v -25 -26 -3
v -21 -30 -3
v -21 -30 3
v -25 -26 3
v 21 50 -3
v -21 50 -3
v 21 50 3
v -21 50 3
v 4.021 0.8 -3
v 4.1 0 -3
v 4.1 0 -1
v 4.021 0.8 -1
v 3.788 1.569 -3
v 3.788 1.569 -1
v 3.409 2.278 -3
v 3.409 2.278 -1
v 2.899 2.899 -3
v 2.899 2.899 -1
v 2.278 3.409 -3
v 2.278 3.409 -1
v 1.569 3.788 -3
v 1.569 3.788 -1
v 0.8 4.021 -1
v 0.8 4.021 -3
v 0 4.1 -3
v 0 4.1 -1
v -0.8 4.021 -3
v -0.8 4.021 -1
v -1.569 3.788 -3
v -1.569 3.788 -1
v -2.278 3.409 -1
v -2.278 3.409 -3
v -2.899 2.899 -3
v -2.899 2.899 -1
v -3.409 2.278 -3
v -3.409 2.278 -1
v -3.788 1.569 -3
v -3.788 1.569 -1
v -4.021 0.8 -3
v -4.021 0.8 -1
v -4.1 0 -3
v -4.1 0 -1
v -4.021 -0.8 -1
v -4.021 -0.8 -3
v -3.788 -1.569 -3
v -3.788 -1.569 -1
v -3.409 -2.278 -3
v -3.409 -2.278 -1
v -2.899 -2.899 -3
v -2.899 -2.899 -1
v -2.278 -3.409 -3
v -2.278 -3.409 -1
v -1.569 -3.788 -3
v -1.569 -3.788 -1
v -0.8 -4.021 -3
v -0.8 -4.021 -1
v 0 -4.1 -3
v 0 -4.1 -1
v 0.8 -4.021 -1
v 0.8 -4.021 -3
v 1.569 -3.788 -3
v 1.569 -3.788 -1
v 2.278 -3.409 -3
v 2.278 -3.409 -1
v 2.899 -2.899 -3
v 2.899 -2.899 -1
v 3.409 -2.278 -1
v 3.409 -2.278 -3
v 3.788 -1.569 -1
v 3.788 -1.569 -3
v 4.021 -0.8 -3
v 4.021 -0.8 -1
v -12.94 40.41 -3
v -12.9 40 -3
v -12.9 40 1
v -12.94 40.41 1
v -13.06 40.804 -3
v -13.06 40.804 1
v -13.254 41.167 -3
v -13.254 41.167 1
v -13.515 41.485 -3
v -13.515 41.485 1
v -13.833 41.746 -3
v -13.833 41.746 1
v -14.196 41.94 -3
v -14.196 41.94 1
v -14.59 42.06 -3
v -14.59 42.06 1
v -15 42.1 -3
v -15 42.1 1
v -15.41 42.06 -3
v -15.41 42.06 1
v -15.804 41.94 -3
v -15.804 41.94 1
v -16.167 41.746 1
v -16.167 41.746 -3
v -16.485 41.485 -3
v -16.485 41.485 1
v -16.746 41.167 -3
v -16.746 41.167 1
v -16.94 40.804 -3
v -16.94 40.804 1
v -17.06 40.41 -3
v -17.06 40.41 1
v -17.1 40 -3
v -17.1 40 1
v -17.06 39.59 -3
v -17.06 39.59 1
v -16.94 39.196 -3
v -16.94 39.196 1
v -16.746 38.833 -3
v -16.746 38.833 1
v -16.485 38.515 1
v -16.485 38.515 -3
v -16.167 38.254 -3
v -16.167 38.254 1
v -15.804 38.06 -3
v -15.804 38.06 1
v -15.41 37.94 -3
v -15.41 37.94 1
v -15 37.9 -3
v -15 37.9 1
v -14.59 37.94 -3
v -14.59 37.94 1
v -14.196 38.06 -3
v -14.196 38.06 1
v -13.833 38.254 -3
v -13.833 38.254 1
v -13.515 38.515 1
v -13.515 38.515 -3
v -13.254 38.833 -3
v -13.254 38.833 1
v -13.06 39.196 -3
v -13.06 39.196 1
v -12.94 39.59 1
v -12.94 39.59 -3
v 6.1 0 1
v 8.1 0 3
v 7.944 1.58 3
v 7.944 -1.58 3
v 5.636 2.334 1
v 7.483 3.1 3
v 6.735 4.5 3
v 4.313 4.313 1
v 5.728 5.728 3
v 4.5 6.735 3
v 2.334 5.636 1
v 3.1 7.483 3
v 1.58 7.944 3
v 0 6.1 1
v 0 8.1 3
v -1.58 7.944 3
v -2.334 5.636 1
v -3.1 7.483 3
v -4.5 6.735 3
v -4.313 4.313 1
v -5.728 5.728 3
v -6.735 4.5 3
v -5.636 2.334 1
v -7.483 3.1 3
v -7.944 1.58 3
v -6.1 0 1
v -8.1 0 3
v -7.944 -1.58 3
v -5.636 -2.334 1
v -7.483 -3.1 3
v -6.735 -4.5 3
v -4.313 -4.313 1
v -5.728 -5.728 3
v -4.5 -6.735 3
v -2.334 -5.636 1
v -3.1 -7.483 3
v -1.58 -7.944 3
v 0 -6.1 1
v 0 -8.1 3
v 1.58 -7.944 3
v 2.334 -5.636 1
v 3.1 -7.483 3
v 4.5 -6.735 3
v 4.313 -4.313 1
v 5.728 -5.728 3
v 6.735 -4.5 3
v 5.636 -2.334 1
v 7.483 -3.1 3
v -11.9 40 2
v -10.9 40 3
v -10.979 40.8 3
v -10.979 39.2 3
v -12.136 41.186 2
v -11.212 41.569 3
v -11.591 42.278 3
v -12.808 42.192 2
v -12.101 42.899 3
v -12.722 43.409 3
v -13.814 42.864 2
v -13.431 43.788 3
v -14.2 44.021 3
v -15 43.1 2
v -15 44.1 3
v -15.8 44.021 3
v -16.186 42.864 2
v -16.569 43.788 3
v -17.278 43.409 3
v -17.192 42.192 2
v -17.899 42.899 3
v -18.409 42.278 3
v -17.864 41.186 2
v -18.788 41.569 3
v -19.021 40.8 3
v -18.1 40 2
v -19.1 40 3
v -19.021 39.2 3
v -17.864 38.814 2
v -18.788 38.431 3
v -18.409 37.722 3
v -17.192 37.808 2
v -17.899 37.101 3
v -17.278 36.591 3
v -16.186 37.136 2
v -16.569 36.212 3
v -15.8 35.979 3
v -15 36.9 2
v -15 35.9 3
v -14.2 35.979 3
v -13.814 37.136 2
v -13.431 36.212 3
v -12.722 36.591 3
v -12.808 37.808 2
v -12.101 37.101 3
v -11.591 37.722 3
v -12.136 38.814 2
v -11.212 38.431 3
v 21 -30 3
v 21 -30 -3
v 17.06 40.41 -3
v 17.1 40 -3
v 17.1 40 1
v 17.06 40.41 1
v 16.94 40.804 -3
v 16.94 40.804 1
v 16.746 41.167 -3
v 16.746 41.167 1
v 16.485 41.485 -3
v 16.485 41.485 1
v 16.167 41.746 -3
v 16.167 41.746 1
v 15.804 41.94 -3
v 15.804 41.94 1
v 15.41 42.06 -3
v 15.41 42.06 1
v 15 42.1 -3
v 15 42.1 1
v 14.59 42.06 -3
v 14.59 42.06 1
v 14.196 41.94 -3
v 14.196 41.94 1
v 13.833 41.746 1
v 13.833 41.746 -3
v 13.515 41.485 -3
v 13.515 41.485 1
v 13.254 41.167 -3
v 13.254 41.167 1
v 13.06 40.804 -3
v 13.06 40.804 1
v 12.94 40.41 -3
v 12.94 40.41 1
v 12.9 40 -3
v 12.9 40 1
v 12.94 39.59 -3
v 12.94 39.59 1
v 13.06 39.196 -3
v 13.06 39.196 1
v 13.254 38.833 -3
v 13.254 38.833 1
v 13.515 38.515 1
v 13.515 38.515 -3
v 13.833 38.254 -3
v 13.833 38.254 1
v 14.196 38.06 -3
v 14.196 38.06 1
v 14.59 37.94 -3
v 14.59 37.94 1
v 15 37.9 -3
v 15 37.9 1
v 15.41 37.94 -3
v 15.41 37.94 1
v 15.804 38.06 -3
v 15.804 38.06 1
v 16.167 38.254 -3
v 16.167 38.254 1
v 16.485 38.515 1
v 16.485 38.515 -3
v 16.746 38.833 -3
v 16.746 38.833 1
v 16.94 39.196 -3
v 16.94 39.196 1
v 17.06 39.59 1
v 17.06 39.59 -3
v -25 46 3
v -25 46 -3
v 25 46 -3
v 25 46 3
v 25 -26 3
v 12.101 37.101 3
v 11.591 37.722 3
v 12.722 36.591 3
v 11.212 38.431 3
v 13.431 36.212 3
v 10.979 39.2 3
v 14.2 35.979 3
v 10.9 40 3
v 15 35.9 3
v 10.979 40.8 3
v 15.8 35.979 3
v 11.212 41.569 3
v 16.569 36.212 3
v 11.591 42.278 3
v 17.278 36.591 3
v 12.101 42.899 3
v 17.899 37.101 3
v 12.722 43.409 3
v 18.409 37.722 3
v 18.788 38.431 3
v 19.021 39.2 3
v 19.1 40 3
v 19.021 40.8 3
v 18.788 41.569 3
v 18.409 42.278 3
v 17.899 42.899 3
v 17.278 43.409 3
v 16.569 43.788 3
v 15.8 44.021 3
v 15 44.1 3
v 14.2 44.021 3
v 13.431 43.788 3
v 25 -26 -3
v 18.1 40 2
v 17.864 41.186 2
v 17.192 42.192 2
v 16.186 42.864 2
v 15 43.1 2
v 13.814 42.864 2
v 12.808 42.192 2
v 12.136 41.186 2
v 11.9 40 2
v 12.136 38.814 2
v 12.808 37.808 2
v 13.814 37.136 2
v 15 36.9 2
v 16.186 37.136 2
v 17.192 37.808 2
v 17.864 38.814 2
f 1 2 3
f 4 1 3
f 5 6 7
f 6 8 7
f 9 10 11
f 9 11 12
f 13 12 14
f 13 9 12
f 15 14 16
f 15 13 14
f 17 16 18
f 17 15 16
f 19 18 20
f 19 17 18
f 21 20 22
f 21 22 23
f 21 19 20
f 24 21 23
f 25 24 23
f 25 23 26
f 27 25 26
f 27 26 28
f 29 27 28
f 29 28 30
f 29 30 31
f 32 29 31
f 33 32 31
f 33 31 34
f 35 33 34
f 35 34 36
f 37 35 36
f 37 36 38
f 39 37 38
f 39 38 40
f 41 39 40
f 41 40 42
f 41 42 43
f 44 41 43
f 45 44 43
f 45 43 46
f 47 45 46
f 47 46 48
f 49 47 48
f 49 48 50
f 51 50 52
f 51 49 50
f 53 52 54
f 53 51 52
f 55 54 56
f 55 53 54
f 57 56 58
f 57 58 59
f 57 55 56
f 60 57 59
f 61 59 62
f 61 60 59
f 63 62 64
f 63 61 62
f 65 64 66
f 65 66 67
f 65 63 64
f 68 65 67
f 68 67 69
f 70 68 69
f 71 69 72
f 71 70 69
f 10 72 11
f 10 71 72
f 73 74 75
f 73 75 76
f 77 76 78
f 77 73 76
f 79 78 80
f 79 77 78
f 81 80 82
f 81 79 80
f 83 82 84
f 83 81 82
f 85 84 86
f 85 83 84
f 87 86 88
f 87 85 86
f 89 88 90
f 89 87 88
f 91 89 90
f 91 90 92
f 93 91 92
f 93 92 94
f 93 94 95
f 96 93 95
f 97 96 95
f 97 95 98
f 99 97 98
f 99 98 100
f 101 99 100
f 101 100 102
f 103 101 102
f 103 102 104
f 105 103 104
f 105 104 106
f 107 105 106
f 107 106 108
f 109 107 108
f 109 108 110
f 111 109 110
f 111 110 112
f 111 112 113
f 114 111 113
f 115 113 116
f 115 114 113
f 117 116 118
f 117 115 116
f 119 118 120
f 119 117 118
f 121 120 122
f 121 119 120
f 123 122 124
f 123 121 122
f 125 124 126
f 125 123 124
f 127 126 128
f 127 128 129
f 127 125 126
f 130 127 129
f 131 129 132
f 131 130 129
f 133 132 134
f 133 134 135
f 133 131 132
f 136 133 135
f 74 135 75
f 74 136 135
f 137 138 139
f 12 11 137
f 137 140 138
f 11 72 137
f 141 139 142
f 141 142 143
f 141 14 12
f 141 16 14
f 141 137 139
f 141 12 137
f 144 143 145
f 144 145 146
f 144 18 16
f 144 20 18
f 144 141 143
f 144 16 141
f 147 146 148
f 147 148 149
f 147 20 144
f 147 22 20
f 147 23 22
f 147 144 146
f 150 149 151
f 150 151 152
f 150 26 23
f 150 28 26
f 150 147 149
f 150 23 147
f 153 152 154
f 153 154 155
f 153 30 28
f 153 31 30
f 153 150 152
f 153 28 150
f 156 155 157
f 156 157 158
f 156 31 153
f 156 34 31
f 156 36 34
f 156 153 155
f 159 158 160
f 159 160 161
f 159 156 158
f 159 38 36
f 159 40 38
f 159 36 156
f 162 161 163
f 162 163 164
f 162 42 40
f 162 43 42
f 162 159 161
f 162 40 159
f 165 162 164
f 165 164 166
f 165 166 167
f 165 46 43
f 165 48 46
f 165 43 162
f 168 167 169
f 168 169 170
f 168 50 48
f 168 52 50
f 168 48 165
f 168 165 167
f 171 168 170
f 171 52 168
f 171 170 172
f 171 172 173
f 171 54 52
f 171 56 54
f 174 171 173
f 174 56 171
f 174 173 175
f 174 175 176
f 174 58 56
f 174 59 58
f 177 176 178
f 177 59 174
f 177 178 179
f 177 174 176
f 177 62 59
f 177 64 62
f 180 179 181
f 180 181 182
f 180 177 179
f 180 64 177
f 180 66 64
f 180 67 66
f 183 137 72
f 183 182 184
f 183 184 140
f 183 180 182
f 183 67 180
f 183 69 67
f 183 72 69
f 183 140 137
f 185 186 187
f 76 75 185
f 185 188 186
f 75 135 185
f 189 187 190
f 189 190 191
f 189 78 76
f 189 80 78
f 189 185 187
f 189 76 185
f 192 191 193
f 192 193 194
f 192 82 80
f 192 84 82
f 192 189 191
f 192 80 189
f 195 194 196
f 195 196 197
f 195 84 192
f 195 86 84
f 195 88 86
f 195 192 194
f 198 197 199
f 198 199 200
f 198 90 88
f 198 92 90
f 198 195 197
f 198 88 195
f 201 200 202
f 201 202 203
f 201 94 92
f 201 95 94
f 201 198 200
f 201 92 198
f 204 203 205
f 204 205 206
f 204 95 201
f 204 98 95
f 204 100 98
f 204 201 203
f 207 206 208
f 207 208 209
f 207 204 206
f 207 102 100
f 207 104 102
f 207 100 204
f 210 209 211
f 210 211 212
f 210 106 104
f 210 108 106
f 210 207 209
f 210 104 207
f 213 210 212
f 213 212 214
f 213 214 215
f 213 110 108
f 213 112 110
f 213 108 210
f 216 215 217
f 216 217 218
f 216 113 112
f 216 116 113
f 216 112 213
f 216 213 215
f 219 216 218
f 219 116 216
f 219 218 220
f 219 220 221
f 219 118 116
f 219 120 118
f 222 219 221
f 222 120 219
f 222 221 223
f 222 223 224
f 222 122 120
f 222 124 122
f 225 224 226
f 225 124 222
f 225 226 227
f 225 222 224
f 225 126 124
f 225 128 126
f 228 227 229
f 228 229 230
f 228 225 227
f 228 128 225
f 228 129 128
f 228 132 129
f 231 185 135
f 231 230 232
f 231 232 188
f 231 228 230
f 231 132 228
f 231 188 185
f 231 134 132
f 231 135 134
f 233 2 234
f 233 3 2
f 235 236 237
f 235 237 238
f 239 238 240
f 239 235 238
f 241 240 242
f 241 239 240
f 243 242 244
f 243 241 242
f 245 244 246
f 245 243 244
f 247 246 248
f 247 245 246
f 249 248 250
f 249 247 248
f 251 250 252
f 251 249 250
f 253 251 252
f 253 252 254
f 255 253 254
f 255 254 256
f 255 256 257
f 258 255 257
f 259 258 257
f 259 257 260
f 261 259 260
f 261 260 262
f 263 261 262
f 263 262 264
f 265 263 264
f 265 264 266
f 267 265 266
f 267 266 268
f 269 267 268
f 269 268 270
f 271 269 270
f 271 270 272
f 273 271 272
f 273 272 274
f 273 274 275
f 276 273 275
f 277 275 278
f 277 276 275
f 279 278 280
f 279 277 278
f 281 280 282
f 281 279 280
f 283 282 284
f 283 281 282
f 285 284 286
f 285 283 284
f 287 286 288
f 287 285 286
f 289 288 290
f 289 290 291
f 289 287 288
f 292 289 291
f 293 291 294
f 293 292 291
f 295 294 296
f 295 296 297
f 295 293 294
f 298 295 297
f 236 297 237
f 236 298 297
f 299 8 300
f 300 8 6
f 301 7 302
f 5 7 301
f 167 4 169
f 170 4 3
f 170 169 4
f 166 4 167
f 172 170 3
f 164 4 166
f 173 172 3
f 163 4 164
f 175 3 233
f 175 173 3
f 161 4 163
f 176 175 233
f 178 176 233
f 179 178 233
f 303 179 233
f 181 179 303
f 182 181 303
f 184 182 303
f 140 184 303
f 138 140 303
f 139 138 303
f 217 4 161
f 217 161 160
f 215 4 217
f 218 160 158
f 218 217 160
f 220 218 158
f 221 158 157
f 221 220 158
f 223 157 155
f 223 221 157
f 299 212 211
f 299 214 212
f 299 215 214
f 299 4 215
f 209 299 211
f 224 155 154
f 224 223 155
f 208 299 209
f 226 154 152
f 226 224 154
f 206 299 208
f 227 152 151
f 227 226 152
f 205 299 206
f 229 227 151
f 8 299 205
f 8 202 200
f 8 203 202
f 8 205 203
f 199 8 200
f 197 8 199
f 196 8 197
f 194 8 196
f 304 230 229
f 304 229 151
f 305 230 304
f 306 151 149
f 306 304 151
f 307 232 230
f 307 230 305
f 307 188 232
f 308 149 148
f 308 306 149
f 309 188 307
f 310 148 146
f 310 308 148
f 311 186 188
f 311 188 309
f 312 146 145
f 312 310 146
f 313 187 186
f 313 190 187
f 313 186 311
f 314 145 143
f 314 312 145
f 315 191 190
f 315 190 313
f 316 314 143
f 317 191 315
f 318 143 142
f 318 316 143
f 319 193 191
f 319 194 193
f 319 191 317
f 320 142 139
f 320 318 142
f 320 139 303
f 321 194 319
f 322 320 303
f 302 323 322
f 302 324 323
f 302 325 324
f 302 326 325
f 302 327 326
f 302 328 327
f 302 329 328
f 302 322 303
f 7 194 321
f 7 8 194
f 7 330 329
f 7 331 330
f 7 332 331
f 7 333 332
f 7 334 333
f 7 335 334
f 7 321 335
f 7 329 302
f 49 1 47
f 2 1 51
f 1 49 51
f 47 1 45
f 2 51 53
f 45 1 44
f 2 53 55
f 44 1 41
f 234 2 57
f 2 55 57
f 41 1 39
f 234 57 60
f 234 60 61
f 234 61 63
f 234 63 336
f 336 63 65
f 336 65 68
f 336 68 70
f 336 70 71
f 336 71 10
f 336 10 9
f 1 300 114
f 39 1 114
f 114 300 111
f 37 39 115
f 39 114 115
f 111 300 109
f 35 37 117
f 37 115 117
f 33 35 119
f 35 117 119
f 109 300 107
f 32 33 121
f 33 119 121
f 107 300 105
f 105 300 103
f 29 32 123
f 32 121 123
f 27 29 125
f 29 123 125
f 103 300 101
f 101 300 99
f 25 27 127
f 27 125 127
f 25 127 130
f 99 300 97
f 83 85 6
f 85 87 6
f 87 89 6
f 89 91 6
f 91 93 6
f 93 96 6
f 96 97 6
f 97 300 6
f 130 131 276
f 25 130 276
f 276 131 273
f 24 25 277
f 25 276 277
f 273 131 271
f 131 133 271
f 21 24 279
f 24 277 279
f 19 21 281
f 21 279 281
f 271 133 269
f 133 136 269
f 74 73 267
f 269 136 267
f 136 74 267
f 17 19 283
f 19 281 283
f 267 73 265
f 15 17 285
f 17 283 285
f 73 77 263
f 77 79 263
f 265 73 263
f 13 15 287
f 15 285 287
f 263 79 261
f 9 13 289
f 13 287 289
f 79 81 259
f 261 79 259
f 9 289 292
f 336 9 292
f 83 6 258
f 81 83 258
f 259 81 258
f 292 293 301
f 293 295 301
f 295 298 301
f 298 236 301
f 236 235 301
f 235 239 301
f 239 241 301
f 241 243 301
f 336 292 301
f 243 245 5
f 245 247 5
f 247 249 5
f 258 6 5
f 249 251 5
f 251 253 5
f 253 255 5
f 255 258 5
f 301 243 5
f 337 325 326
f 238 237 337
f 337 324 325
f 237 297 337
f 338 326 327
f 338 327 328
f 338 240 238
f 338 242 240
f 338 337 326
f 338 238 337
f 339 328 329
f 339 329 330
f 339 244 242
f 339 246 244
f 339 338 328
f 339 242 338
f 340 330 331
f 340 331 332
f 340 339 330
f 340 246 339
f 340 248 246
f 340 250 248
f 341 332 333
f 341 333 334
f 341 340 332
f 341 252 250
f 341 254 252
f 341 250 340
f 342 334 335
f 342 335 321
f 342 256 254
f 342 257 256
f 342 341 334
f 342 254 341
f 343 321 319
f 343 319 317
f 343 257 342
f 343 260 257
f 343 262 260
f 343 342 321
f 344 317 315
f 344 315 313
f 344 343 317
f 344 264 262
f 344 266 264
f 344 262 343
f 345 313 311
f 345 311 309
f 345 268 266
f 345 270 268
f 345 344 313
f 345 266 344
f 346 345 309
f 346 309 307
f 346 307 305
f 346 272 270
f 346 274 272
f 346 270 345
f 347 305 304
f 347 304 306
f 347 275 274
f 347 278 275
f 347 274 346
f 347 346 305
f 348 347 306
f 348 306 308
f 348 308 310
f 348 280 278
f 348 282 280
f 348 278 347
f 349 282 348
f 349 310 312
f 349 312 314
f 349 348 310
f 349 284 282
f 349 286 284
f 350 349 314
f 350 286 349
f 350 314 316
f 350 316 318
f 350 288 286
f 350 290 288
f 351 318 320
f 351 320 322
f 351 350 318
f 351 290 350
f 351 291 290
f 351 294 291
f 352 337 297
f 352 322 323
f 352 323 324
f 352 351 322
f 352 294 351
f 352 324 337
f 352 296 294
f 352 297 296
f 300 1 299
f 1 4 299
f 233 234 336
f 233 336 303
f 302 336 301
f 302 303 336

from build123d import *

# Parameters (mm, degrees)
SKETCH_1_W      = 50
SKETCH_1_H      = 80
SKETCH_1_R      = 4.1
SKETCH_1_R_2    = 2.1
EXTRUDE_1_DEPTH = 3
CHAMFER_2_SIZE  = 4
CHAMFER_3_SIZE  = 2


with BuildPart() as part:
    # 草图1 → 凸台-拉伸1 (new, symmetric)
    with BuildSketch(Plane.XY):
        with Locations((0, 10)):
            Rectangle(SKETCH_1_W, SKETCH_1_H)
        Circle(SKETCH_1_R, mode=Mode.SUBTRACT)
        with Locations((-15, 40)):
            Circle(SKETCH_1_R_2, mode=Mode.SUBTRACT)
        with Locations((15, 40)):
            Circle(SKETCH_1_R_2, mode=Mode.SUBTRACT)
    extrude(amount=EXTRUDE_1_DEPTH, both=True)

    # 倒角2
    chamfer_2_edges = [part.edges().sort_by_distance(p)[0] for p in [
        (-4.1, 0, 3),
        (-25, 50, 0),
        (25, 50, 0),
        (25, -30, 0),
        (-25, -30, 0),
    ]]
    chamfer(chamfer_2_edges, length=CHAMFER_2_SIZE)

    # 倒角3
    chamfer_3_edges = [part.edges().sort_by_distance(p)[0] for p in [
        (-17.1, 40, 3),
        (12.9, 40, 3),
    ]]
    chamfer(chamfer_3_edges, length=CHAMFER_3_SIZE)


solid = part.part
